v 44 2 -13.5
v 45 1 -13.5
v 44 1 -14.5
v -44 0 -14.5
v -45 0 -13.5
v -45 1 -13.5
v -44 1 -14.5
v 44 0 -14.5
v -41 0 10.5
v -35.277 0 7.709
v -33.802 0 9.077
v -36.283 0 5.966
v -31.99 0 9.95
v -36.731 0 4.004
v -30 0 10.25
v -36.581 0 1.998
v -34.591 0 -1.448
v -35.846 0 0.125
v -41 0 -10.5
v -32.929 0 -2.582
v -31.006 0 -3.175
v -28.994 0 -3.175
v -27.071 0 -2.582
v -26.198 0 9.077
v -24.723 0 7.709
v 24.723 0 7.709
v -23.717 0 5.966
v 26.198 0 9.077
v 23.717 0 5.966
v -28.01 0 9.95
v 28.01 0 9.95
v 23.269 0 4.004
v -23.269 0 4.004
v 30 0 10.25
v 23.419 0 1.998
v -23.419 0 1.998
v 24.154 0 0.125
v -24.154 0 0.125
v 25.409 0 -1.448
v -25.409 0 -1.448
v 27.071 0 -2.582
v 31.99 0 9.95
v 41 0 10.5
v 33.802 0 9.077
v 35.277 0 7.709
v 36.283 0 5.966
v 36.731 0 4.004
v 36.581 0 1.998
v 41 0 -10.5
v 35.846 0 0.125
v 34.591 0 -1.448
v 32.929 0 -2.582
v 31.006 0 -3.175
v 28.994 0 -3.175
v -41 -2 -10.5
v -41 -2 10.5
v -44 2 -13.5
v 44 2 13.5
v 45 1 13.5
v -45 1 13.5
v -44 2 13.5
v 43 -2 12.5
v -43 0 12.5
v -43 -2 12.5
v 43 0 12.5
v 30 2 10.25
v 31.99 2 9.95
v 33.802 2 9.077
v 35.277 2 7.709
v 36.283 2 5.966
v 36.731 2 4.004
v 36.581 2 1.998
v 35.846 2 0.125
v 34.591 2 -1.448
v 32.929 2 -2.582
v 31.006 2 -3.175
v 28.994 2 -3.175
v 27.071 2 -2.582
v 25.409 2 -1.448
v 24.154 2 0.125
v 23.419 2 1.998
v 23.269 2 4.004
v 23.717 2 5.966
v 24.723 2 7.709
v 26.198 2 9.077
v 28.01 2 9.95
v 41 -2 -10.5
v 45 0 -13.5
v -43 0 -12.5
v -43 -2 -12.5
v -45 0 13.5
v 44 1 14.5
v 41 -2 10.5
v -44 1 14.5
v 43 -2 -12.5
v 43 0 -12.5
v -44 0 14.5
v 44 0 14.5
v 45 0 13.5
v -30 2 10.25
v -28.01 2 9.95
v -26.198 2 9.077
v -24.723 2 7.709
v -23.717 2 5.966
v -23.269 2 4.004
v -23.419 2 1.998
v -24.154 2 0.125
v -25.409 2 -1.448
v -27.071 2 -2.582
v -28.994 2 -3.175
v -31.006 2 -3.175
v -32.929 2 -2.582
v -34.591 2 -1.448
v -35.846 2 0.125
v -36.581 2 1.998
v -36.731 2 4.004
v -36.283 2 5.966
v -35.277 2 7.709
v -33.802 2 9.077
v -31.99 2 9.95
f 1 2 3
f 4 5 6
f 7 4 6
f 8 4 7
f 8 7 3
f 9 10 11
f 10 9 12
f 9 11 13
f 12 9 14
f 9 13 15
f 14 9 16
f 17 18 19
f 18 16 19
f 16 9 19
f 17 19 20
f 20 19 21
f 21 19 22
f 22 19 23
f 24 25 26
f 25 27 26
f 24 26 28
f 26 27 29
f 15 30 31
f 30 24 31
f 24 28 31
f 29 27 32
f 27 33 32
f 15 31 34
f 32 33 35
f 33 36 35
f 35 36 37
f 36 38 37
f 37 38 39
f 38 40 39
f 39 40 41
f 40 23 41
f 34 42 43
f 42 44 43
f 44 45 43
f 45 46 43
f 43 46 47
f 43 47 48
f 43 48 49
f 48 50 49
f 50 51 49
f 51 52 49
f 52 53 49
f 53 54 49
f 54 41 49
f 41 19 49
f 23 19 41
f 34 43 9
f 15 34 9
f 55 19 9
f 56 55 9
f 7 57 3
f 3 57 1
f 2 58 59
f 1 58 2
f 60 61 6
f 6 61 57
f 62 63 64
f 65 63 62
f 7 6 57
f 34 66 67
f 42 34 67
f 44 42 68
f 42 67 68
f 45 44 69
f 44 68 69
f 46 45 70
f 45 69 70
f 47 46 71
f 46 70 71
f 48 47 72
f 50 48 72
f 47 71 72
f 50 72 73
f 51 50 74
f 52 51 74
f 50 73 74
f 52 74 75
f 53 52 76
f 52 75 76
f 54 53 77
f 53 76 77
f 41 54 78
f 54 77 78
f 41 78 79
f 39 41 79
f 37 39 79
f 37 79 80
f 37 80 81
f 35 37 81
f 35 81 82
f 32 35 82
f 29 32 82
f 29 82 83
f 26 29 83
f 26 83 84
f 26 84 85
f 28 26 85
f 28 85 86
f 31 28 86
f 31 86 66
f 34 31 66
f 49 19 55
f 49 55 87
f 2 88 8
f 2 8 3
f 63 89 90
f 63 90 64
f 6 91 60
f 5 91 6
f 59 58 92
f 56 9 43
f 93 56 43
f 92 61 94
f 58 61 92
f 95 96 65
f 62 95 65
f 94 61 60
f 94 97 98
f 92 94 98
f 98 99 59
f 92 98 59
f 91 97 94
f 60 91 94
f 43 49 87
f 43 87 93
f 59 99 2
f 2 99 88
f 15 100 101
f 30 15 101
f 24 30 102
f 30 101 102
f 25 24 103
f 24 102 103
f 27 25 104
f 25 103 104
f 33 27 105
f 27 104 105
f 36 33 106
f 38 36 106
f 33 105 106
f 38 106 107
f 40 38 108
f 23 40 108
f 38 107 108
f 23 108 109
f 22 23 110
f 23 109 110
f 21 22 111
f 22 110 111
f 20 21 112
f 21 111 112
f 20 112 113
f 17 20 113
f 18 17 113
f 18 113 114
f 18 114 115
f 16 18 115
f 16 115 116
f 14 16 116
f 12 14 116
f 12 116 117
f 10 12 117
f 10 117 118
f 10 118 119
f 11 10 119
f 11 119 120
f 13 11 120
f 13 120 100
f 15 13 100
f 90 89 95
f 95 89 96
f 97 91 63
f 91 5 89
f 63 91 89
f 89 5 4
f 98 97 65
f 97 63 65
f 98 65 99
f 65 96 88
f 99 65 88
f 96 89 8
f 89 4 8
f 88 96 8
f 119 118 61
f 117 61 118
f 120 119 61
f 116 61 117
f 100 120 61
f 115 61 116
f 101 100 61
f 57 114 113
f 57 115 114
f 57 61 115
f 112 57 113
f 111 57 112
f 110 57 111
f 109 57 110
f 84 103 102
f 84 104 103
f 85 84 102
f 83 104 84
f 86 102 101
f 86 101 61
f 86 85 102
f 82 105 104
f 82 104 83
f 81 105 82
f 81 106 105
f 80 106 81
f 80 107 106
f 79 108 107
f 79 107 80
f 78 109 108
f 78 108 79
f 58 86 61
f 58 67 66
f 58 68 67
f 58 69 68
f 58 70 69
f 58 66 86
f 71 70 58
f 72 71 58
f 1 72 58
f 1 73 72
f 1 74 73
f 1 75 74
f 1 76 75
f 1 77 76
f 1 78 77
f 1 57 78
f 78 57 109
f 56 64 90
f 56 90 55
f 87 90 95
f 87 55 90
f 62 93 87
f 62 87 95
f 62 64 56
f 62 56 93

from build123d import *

# Parameters (mm, degrees)
SKETCH1_W           = 90
SKETCH1_H           = 29
BOSS_EXTRUDE1_DEPTH = 2
CHAMFER1_SIZE       = 1
SKETCH2_R           = 6.75
CUT_EXTRUDE1_DEPTH  = 48.32071428
SKETCH3_W           = 86
SKETCH3_H           = 25
SKETCH3_W_2         = 82
SKETCH3_H_2         = 21
BOSS_EXTRUDE2_DEPTH = 2


with BuildPart() as part:
    # Sketch1 → Boss-Extrude1 (new body)
    with BuildSketch(Plane(origin=(0, 0, 0), x_dir=(1, 0, 0), z_dir=(0, 1, 0))):
        Rectangle(SKETCH1_W, SKETCH1_H)
    extrude(amount=BOSS_EXTRUDE1_DEPTH)

    # Chamfer1
    chamfer1_edges = [part.edges().sort_by_distance(p)[0] for p in [
        (-45, 2, 0),
        (0, 2, 14.5),
        (45, 2, 0),
        (45, 1, 14.5),
        (-45, 1, 14.5),
        (-45, 1, -14.5),
        (45, 1, -14.5),
        (0, 2, -14.5),
    ]]
    chamfer(chamfer1_edges, length=CHAMFER1_SIZE)

    # Sketch2 → Cut-Extrude1 (cut, through all)
    with BuildSketch(Plane(origin=(0, 2, 0), x_dir=(1, 0, 0), z_dir=(0, 1, 0))):
        with Locations(Location((-30, -3.5, 0), (0, 0, 270))):
            Circle(SKETCH2_R)
        with Locations(Location((30, -3.5, 0), (0, 0, 270))):
            Circle(SKETCH2_R)
    extrude(amount=-CUT_EXTRUDE1_DEPTH, mode=Mode.SUBTRACT)

    # Sketch3 → Boss-Extrude2 (add)
    with BuildSketch(Plane.XZ):
        Rectangle(SKETCH3_W, SKETCH3_H)
        Rectangle(SKETCH3_W_2, SKETCH3_H_2, mode=Mode.SUBTRACT)
    extrude(amount=BOSS_EXTRUDE2_DEPTH)


solid = part.part
